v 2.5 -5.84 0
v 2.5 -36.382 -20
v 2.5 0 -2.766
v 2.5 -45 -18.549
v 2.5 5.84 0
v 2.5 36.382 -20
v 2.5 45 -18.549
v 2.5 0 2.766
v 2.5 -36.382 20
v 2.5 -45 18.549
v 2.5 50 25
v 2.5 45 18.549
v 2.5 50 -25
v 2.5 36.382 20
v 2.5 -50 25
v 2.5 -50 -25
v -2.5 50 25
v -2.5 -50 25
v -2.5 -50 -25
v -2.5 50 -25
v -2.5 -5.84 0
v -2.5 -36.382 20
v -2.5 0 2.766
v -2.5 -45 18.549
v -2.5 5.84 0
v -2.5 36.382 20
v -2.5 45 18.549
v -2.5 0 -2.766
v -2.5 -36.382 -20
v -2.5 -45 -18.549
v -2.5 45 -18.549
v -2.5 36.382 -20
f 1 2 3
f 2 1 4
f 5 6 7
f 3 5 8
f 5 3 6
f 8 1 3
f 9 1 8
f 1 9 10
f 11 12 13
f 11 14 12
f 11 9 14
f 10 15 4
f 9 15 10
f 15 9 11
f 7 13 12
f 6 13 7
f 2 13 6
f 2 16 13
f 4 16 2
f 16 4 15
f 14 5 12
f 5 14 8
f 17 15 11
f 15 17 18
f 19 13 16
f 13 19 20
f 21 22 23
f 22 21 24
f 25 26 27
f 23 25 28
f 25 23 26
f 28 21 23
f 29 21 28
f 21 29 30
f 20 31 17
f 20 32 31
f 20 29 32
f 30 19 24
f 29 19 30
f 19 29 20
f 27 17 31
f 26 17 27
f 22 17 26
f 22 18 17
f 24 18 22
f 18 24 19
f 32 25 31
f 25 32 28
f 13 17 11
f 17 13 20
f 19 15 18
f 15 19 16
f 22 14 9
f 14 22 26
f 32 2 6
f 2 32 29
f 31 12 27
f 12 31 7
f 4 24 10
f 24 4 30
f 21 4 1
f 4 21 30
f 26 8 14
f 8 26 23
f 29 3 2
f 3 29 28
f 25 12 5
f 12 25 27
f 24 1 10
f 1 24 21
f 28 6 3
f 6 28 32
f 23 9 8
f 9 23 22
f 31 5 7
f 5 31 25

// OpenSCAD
module make_cross_beams_1(w, h, t, $fn=50){

    //sohcahtoa
    angle = atan((h-t)/(w-t));

    //c^2 = a^2 + b^2
    diagonal = sqrt(pow(w-t, 2) + pow(h-t, 2));

	    for(i=[0:1]){
	        mirror([0,0,i])
	        translate([0, -w/2+t/2, -h/2+t/2])
	        rotate([angle, 0, 0])
	        translate([-t/2, 0, -t/2])
	        cube([t, diagonal, t], center=false);
	    }
}

module make_cross_beams_2(w, h, t, $fn=50){

    //sohcahtoa
    angle = atan((h-t)/(w-t));

    //c^2 = a^2 + b^2
    diagonal = sqrt(pow(w-t, 2) + pow(h-t, 2));

	    for(i=[-1:2:1]){
			intersection(){
				translate([0, 0, -h/2*i])
				scale([1, 1, (h+t/2)/w])
				rotate([0, 90, 0])
				difference(){
					cylinder(d=w, h=t, center=true, $fn=$fn);
					cylinder(d=w-t*2, h=t, center=true, $fn=$fn);
				}
				cube([t, w, h], center=true);
			}
		}
}

module make_cross_plate(w, h, t, hub_d=0, cross_type=1, $fn=50){

    //sohcahtoa
    angle = atan((h-t)/(w-t));

    //c^2 = a^2 + b^2
    diagonal = sqrt(pow(w-t, 2) + pow(h-t, 2));

    // border
    difference(){
        cube([t,w,h], center=true);
        cube([t*2,w-t*2,h-t*2], center=true);
    }

    // cross beam
	if(cross_type==1){
		make_cross_beams_1(w=w, h=h, t=t);
	}
	if(cross_type==2){
		make_cross_beams_2(w=w, h=h, t=t);
	}
    
	if(hub_d){
	    rotate([0,90,0])
	    cylinder(d=hub_d, h=t, center=true, $fn=$fn);
	}

}

u = 5;

make_cross_plate(
	w=u*20,
	h=u*10,
	hub_d=0,//u*4,
	t=u,
	cross_type=1
);
